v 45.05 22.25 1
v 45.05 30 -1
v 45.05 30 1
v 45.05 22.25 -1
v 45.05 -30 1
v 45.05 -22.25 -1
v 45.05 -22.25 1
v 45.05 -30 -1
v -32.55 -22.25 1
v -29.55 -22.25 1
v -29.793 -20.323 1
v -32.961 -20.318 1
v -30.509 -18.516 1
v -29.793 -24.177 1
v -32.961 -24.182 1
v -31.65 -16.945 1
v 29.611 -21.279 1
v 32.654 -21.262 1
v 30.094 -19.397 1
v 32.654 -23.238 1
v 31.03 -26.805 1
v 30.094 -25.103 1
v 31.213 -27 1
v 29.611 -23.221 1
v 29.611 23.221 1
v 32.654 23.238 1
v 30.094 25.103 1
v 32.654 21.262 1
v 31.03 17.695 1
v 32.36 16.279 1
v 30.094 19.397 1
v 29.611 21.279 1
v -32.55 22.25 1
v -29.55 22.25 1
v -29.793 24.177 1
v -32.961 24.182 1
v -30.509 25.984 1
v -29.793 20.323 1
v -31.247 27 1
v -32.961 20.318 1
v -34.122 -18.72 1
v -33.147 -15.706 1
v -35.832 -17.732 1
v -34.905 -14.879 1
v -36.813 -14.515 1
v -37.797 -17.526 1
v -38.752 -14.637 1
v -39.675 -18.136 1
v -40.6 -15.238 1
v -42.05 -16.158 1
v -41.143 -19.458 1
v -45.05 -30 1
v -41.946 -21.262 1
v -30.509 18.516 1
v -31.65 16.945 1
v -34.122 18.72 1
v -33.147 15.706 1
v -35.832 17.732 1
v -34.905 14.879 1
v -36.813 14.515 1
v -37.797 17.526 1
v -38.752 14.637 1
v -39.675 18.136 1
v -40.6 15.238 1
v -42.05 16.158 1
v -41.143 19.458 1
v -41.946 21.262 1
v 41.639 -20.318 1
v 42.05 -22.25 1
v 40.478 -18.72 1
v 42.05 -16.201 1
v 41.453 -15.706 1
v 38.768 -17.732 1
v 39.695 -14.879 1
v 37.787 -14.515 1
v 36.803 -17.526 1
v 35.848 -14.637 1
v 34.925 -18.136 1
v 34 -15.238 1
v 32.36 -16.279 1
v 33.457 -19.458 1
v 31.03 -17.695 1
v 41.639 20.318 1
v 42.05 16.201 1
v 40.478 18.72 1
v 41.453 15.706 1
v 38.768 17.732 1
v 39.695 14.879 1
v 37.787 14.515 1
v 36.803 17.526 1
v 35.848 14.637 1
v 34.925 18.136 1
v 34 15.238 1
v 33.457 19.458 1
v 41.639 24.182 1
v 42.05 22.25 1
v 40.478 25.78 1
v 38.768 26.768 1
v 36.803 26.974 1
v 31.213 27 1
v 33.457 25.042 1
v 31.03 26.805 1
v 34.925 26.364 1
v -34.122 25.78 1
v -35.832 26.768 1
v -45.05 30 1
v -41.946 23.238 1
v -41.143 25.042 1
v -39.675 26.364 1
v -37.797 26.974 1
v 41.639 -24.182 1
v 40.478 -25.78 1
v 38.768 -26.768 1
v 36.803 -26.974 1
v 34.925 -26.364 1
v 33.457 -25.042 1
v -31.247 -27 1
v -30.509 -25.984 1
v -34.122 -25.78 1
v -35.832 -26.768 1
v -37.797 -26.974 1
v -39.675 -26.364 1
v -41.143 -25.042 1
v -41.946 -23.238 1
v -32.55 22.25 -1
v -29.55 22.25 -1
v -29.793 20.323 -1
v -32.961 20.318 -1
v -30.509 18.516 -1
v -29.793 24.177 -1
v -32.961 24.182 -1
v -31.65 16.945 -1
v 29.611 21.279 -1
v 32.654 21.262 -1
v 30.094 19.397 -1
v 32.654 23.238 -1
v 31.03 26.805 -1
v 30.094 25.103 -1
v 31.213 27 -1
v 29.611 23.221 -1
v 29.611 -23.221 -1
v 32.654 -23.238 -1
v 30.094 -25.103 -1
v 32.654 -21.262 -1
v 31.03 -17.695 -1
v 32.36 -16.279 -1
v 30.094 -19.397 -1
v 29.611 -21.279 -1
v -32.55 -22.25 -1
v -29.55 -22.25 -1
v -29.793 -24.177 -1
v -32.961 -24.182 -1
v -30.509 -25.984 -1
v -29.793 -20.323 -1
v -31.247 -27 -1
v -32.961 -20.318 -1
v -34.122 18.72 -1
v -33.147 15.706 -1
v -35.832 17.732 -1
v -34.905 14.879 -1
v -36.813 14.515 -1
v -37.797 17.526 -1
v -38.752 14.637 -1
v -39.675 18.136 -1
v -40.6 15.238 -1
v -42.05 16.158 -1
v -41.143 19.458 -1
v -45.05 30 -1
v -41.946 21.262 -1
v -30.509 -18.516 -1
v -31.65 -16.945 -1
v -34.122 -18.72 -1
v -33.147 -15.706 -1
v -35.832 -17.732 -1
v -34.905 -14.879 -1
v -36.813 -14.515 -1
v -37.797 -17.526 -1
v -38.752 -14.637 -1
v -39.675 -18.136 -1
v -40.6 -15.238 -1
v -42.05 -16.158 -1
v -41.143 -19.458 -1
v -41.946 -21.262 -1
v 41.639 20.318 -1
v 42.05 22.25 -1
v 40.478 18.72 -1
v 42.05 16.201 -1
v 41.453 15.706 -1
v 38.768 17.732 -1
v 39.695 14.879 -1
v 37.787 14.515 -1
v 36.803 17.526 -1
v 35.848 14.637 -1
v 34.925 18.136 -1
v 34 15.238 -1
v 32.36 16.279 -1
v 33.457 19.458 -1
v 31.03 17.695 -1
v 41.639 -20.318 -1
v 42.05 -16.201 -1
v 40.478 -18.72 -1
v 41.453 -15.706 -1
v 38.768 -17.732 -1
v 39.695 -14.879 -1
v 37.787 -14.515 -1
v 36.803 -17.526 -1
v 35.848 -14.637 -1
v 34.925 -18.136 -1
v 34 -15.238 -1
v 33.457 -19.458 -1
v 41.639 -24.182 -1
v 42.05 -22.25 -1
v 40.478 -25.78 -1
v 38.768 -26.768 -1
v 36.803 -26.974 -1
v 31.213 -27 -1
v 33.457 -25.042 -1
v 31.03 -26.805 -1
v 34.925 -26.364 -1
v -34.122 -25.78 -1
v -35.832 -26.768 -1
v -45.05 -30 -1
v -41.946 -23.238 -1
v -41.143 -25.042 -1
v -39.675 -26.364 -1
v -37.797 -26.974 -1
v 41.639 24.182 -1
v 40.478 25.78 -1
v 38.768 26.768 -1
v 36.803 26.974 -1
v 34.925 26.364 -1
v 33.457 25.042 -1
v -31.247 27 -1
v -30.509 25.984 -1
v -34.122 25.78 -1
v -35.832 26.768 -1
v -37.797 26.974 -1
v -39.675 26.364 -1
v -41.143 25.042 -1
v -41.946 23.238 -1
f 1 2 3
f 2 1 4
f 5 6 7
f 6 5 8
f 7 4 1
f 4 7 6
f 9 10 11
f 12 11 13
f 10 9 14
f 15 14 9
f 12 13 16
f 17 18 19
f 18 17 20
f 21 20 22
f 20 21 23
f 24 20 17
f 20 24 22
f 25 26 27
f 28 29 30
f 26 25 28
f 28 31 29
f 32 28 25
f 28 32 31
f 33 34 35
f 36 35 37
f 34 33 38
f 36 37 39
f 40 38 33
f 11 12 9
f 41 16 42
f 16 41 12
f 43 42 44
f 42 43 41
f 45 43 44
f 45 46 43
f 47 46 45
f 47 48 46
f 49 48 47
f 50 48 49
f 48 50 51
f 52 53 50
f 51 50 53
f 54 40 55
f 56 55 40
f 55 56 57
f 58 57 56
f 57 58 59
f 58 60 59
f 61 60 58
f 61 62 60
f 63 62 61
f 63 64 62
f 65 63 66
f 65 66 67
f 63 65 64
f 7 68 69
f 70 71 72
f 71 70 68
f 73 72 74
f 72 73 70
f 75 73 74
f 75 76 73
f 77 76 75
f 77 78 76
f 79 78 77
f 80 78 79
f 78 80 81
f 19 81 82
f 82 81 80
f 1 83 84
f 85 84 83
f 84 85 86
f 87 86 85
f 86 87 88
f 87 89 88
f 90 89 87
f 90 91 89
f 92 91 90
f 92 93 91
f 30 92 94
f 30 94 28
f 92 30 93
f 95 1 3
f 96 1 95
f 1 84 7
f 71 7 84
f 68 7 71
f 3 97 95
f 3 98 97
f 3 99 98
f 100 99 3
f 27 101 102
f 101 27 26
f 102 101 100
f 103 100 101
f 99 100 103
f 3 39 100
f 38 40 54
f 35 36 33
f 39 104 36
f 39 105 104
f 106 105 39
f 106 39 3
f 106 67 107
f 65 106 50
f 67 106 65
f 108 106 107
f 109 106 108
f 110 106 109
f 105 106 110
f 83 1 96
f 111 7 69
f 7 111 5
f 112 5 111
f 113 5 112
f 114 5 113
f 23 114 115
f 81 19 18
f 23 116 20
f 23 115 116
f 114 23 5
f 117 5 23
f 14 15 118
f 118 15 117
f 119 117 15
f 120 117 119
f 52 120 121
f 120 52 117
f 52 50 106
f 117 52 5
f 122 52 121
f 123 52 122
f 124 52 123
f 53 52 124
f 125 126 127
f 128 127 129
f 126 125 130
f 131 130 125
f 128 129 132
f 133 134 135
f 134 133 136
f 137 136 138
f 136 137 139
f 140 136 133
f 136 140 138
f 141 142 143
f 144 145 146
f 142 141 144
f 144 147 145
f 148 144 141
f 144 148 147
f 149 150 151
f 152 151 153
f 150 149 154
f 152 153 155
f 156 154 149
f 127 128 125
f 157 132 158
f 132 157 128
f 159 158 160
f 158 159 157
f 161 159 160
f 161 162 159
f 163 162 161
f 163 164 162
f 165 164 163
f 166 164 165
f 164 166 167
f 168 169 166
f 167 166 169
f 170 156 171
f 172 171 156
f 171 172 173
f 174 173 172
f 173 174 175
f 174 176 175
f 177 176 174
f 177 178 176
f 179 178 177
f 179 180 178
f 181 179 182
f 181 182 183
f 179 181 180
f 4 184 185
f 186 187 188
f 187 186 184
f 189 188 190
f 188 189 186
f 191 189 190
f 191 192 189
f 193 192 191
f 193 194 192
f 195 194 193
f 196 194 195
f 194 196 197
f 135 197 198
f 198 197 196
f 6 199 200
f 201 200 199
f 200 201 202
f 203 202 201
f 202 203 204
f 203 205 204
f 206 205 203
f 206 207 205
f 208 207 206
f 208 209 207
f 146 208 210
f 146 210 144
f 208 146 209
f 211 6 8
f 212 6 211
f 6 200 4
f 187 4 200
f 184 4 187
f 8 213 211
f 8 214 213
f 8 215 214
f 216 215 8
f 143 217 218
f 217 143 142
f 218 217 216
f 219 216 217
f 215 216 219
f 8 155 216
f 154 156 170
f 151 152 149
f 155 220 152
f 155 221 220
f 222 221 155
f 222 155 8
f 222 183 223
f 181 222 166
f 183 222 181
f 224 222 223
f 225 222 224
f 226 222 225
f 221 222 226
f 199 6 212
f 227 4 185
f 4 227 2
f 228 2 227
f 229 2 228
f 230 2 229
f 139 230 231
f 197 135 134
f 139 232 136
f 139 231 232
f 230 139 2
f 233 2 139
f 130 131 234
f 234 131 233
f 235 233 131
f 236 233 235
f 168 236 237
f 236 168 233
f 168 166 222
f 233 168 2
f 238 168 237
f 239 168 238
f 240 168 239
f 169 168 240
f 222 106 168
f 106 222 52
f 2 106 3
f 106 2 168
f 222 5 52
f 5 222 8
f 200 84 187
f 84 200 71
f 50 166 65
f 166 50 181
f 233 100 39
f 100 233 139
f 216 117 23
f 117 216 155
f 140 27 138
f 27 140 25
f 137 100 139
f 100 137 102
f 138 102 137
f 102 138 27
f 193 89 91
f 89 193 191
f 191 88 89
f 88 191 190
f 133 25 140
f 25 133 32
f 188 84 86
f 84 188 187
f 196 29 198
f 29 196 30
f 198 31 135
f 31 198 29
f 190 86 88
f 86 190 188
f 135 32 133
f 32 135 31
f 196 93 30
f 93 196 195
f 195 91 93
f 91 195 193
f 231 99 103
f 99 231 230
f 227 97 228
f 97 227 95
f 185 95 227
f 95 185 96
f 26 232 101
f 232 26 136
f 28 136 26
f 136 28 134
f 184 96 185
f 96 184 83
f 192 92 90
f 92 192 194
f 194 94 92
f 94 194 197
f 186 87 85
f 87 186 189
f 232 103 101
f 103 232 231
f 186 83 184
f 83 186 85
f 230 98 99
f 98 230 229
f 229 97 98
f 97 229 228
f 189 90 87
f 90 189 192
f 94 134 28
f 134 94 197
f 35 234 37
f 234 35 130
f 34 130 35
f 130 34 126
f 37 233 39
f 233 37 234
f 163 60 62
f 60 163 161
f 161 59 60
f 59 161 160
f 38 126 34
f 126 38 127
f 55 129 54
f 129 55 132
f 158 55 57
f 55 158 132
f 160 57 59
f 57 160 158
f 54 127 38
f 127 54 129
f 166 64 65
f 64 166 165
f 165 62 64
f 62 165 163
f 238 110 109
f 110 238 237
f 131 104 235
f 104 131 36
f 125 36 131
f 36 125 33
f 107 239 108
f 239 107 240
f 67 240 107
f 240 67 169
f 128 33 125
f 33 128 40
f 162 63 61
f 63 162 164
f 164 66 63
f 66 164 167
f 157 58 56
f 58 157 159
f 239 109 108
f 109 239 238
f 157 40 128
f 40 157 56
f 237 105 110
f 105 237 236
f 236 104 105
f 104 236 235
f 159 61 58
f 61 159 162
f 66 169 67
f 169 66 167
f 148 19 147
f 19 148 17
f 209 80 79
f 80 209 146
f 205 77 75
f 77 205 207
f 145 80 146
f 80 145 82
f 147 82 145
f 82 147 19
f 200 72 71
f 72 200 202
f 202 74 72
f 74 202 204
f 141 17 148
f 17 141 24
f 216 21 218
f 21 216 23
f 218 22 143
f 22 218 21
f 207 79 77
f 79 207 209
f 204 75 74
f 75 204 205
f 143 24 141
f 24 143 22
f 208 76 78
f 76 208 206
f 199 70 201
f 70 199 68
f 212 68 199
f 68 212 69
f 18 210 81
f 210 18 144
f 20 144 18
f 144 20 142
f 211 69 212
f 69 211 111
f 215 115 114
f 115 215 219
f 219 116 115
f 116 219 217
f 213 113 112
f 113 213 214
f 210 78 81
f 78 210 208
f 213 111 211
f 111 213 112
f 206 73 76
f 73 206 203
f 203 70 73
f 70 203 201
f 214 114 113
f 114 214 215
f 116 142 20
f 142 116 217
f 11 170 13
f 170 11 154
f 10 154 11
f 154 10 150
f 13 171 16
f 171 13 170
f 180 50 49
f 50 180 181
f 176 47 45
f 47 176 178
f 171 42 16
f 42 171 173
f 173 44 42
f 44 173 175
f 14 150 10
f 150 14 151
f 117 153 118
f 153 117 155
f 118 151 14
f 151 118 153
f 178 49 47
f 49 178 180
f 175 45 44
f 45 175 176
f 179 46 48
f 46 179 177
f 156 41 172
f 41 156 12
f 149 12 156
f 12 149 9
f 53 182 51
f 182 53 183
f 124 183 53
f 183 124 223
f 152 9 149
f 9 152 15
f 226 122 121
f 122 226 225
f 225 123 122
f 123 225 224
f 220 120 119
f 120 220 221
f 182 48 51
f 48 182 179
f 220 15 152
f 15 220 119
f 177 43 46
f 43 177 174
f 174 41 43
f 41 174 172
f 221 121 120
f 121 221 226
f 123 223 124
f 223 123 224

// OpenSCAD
//Bolt Hole Pattern
//by Sithrazer
//https://www.thingiverse.com/Sithrazer
//https://github.com/Sithrazer/3DPrintingProjects
//License: CC BY-NC-SA
//https://creativecommons.org/licenses/by-nc-sa/4.0/

/*[ALL DIMENSIONS IN MILLIMETERS]*/
//1 inch equals 25.4 mm
one_inch=25.4;
/*[Bolt Pattern]*/
//Hole Diameter
diameter=9.5; // 3/8in
//Width On-Center
width=44.5; // ~1 3/4in
//Length On-Center
length=74.6; // ~2 15/16in

/*[Template Features]*/
//Border Around Features
border=3; //[2:8]
//Template Thickness
thick=2; //[2:20]
//Clamp Tabs
tabs=false;

/*[Edge Guide]*/
//Edge Guide
guide=false;
//Edge Guide Side
guide_side=0;//[0:Short Side,1:Long Side]
//Edge Guide Distance On-Center
guide_dist=10;
//Edge Guide Height
guide_height=10; //[2:20]

//Useful calculations
//total length including all features
t_length=length+diameter+border*2;
//total width including all features
t_width=width+diameter+border*2;
radius=diameter/2;

//Assemble Template Basics
make_plate(thick, border, t_width, t_length);
translate([length/2,width/2,0])
    make_hole(thick, border, radius);
translate([-(length/2),width/2,0])
    make_hole(thick, border, radius);
translate([length/2,-(width/2),0])
    make_hole(thick, border, radius);
translate([-(length/2),-(width/2),0])
    make_hole(thick, border, radius);
    
//Assemble Clamp Tabs
if (tabs){
    //long side tab
    translate([0,-(t_width/8)+t_width/2,0])
    cube([length/2, t_width/4,thick],center=true);
    //short side tab
    translate([-(t_length/8)+t_length/2,0])
    cube([t_length/4, width/2,thick],center=true);
}

//Assemble Edge Guides
if((guide)&&(guide_side==0)){
    make_guide(thick, border, width-diameter, guide_dist, guide_height, length);
}
if((guide)&&(guide_side==1)){
    rotate([0,0,90])
    make_guide(thick, border, length-diameter, guide_dist, guide_height, width);
}

module make_plate(thick, border, width, length){
    difference(){
        cube([length, width, thick],center=true);
        cube([length-border*2, width-border*2, thick+1],center=true);
    }
}

module make_hole(thick, border, radius){
    difference(){
        cylinder(thick,r=radius+border,center=true);
        cylinder(thick+1,r=radius,center=true);
    }
}

module make_guide(thick, border, width, guide_dist, guide_height, to_center){
    translate([to_center/2,0,-(thick/2)])
    union(){
        //Assemble stop
        translate([guide_dist,-(width/2),0])
        cube([border,width,guide_height+thick],center=false);
        //Assemble bracket
        translate([0,-(width/2),0]){
            difference(){
                cube([guide_dist,width,thick]);
                translate([border,border,-1])
                cube([guide_dist-border*2,width-border*2,thick+2]);
            }
        }
    }
}
